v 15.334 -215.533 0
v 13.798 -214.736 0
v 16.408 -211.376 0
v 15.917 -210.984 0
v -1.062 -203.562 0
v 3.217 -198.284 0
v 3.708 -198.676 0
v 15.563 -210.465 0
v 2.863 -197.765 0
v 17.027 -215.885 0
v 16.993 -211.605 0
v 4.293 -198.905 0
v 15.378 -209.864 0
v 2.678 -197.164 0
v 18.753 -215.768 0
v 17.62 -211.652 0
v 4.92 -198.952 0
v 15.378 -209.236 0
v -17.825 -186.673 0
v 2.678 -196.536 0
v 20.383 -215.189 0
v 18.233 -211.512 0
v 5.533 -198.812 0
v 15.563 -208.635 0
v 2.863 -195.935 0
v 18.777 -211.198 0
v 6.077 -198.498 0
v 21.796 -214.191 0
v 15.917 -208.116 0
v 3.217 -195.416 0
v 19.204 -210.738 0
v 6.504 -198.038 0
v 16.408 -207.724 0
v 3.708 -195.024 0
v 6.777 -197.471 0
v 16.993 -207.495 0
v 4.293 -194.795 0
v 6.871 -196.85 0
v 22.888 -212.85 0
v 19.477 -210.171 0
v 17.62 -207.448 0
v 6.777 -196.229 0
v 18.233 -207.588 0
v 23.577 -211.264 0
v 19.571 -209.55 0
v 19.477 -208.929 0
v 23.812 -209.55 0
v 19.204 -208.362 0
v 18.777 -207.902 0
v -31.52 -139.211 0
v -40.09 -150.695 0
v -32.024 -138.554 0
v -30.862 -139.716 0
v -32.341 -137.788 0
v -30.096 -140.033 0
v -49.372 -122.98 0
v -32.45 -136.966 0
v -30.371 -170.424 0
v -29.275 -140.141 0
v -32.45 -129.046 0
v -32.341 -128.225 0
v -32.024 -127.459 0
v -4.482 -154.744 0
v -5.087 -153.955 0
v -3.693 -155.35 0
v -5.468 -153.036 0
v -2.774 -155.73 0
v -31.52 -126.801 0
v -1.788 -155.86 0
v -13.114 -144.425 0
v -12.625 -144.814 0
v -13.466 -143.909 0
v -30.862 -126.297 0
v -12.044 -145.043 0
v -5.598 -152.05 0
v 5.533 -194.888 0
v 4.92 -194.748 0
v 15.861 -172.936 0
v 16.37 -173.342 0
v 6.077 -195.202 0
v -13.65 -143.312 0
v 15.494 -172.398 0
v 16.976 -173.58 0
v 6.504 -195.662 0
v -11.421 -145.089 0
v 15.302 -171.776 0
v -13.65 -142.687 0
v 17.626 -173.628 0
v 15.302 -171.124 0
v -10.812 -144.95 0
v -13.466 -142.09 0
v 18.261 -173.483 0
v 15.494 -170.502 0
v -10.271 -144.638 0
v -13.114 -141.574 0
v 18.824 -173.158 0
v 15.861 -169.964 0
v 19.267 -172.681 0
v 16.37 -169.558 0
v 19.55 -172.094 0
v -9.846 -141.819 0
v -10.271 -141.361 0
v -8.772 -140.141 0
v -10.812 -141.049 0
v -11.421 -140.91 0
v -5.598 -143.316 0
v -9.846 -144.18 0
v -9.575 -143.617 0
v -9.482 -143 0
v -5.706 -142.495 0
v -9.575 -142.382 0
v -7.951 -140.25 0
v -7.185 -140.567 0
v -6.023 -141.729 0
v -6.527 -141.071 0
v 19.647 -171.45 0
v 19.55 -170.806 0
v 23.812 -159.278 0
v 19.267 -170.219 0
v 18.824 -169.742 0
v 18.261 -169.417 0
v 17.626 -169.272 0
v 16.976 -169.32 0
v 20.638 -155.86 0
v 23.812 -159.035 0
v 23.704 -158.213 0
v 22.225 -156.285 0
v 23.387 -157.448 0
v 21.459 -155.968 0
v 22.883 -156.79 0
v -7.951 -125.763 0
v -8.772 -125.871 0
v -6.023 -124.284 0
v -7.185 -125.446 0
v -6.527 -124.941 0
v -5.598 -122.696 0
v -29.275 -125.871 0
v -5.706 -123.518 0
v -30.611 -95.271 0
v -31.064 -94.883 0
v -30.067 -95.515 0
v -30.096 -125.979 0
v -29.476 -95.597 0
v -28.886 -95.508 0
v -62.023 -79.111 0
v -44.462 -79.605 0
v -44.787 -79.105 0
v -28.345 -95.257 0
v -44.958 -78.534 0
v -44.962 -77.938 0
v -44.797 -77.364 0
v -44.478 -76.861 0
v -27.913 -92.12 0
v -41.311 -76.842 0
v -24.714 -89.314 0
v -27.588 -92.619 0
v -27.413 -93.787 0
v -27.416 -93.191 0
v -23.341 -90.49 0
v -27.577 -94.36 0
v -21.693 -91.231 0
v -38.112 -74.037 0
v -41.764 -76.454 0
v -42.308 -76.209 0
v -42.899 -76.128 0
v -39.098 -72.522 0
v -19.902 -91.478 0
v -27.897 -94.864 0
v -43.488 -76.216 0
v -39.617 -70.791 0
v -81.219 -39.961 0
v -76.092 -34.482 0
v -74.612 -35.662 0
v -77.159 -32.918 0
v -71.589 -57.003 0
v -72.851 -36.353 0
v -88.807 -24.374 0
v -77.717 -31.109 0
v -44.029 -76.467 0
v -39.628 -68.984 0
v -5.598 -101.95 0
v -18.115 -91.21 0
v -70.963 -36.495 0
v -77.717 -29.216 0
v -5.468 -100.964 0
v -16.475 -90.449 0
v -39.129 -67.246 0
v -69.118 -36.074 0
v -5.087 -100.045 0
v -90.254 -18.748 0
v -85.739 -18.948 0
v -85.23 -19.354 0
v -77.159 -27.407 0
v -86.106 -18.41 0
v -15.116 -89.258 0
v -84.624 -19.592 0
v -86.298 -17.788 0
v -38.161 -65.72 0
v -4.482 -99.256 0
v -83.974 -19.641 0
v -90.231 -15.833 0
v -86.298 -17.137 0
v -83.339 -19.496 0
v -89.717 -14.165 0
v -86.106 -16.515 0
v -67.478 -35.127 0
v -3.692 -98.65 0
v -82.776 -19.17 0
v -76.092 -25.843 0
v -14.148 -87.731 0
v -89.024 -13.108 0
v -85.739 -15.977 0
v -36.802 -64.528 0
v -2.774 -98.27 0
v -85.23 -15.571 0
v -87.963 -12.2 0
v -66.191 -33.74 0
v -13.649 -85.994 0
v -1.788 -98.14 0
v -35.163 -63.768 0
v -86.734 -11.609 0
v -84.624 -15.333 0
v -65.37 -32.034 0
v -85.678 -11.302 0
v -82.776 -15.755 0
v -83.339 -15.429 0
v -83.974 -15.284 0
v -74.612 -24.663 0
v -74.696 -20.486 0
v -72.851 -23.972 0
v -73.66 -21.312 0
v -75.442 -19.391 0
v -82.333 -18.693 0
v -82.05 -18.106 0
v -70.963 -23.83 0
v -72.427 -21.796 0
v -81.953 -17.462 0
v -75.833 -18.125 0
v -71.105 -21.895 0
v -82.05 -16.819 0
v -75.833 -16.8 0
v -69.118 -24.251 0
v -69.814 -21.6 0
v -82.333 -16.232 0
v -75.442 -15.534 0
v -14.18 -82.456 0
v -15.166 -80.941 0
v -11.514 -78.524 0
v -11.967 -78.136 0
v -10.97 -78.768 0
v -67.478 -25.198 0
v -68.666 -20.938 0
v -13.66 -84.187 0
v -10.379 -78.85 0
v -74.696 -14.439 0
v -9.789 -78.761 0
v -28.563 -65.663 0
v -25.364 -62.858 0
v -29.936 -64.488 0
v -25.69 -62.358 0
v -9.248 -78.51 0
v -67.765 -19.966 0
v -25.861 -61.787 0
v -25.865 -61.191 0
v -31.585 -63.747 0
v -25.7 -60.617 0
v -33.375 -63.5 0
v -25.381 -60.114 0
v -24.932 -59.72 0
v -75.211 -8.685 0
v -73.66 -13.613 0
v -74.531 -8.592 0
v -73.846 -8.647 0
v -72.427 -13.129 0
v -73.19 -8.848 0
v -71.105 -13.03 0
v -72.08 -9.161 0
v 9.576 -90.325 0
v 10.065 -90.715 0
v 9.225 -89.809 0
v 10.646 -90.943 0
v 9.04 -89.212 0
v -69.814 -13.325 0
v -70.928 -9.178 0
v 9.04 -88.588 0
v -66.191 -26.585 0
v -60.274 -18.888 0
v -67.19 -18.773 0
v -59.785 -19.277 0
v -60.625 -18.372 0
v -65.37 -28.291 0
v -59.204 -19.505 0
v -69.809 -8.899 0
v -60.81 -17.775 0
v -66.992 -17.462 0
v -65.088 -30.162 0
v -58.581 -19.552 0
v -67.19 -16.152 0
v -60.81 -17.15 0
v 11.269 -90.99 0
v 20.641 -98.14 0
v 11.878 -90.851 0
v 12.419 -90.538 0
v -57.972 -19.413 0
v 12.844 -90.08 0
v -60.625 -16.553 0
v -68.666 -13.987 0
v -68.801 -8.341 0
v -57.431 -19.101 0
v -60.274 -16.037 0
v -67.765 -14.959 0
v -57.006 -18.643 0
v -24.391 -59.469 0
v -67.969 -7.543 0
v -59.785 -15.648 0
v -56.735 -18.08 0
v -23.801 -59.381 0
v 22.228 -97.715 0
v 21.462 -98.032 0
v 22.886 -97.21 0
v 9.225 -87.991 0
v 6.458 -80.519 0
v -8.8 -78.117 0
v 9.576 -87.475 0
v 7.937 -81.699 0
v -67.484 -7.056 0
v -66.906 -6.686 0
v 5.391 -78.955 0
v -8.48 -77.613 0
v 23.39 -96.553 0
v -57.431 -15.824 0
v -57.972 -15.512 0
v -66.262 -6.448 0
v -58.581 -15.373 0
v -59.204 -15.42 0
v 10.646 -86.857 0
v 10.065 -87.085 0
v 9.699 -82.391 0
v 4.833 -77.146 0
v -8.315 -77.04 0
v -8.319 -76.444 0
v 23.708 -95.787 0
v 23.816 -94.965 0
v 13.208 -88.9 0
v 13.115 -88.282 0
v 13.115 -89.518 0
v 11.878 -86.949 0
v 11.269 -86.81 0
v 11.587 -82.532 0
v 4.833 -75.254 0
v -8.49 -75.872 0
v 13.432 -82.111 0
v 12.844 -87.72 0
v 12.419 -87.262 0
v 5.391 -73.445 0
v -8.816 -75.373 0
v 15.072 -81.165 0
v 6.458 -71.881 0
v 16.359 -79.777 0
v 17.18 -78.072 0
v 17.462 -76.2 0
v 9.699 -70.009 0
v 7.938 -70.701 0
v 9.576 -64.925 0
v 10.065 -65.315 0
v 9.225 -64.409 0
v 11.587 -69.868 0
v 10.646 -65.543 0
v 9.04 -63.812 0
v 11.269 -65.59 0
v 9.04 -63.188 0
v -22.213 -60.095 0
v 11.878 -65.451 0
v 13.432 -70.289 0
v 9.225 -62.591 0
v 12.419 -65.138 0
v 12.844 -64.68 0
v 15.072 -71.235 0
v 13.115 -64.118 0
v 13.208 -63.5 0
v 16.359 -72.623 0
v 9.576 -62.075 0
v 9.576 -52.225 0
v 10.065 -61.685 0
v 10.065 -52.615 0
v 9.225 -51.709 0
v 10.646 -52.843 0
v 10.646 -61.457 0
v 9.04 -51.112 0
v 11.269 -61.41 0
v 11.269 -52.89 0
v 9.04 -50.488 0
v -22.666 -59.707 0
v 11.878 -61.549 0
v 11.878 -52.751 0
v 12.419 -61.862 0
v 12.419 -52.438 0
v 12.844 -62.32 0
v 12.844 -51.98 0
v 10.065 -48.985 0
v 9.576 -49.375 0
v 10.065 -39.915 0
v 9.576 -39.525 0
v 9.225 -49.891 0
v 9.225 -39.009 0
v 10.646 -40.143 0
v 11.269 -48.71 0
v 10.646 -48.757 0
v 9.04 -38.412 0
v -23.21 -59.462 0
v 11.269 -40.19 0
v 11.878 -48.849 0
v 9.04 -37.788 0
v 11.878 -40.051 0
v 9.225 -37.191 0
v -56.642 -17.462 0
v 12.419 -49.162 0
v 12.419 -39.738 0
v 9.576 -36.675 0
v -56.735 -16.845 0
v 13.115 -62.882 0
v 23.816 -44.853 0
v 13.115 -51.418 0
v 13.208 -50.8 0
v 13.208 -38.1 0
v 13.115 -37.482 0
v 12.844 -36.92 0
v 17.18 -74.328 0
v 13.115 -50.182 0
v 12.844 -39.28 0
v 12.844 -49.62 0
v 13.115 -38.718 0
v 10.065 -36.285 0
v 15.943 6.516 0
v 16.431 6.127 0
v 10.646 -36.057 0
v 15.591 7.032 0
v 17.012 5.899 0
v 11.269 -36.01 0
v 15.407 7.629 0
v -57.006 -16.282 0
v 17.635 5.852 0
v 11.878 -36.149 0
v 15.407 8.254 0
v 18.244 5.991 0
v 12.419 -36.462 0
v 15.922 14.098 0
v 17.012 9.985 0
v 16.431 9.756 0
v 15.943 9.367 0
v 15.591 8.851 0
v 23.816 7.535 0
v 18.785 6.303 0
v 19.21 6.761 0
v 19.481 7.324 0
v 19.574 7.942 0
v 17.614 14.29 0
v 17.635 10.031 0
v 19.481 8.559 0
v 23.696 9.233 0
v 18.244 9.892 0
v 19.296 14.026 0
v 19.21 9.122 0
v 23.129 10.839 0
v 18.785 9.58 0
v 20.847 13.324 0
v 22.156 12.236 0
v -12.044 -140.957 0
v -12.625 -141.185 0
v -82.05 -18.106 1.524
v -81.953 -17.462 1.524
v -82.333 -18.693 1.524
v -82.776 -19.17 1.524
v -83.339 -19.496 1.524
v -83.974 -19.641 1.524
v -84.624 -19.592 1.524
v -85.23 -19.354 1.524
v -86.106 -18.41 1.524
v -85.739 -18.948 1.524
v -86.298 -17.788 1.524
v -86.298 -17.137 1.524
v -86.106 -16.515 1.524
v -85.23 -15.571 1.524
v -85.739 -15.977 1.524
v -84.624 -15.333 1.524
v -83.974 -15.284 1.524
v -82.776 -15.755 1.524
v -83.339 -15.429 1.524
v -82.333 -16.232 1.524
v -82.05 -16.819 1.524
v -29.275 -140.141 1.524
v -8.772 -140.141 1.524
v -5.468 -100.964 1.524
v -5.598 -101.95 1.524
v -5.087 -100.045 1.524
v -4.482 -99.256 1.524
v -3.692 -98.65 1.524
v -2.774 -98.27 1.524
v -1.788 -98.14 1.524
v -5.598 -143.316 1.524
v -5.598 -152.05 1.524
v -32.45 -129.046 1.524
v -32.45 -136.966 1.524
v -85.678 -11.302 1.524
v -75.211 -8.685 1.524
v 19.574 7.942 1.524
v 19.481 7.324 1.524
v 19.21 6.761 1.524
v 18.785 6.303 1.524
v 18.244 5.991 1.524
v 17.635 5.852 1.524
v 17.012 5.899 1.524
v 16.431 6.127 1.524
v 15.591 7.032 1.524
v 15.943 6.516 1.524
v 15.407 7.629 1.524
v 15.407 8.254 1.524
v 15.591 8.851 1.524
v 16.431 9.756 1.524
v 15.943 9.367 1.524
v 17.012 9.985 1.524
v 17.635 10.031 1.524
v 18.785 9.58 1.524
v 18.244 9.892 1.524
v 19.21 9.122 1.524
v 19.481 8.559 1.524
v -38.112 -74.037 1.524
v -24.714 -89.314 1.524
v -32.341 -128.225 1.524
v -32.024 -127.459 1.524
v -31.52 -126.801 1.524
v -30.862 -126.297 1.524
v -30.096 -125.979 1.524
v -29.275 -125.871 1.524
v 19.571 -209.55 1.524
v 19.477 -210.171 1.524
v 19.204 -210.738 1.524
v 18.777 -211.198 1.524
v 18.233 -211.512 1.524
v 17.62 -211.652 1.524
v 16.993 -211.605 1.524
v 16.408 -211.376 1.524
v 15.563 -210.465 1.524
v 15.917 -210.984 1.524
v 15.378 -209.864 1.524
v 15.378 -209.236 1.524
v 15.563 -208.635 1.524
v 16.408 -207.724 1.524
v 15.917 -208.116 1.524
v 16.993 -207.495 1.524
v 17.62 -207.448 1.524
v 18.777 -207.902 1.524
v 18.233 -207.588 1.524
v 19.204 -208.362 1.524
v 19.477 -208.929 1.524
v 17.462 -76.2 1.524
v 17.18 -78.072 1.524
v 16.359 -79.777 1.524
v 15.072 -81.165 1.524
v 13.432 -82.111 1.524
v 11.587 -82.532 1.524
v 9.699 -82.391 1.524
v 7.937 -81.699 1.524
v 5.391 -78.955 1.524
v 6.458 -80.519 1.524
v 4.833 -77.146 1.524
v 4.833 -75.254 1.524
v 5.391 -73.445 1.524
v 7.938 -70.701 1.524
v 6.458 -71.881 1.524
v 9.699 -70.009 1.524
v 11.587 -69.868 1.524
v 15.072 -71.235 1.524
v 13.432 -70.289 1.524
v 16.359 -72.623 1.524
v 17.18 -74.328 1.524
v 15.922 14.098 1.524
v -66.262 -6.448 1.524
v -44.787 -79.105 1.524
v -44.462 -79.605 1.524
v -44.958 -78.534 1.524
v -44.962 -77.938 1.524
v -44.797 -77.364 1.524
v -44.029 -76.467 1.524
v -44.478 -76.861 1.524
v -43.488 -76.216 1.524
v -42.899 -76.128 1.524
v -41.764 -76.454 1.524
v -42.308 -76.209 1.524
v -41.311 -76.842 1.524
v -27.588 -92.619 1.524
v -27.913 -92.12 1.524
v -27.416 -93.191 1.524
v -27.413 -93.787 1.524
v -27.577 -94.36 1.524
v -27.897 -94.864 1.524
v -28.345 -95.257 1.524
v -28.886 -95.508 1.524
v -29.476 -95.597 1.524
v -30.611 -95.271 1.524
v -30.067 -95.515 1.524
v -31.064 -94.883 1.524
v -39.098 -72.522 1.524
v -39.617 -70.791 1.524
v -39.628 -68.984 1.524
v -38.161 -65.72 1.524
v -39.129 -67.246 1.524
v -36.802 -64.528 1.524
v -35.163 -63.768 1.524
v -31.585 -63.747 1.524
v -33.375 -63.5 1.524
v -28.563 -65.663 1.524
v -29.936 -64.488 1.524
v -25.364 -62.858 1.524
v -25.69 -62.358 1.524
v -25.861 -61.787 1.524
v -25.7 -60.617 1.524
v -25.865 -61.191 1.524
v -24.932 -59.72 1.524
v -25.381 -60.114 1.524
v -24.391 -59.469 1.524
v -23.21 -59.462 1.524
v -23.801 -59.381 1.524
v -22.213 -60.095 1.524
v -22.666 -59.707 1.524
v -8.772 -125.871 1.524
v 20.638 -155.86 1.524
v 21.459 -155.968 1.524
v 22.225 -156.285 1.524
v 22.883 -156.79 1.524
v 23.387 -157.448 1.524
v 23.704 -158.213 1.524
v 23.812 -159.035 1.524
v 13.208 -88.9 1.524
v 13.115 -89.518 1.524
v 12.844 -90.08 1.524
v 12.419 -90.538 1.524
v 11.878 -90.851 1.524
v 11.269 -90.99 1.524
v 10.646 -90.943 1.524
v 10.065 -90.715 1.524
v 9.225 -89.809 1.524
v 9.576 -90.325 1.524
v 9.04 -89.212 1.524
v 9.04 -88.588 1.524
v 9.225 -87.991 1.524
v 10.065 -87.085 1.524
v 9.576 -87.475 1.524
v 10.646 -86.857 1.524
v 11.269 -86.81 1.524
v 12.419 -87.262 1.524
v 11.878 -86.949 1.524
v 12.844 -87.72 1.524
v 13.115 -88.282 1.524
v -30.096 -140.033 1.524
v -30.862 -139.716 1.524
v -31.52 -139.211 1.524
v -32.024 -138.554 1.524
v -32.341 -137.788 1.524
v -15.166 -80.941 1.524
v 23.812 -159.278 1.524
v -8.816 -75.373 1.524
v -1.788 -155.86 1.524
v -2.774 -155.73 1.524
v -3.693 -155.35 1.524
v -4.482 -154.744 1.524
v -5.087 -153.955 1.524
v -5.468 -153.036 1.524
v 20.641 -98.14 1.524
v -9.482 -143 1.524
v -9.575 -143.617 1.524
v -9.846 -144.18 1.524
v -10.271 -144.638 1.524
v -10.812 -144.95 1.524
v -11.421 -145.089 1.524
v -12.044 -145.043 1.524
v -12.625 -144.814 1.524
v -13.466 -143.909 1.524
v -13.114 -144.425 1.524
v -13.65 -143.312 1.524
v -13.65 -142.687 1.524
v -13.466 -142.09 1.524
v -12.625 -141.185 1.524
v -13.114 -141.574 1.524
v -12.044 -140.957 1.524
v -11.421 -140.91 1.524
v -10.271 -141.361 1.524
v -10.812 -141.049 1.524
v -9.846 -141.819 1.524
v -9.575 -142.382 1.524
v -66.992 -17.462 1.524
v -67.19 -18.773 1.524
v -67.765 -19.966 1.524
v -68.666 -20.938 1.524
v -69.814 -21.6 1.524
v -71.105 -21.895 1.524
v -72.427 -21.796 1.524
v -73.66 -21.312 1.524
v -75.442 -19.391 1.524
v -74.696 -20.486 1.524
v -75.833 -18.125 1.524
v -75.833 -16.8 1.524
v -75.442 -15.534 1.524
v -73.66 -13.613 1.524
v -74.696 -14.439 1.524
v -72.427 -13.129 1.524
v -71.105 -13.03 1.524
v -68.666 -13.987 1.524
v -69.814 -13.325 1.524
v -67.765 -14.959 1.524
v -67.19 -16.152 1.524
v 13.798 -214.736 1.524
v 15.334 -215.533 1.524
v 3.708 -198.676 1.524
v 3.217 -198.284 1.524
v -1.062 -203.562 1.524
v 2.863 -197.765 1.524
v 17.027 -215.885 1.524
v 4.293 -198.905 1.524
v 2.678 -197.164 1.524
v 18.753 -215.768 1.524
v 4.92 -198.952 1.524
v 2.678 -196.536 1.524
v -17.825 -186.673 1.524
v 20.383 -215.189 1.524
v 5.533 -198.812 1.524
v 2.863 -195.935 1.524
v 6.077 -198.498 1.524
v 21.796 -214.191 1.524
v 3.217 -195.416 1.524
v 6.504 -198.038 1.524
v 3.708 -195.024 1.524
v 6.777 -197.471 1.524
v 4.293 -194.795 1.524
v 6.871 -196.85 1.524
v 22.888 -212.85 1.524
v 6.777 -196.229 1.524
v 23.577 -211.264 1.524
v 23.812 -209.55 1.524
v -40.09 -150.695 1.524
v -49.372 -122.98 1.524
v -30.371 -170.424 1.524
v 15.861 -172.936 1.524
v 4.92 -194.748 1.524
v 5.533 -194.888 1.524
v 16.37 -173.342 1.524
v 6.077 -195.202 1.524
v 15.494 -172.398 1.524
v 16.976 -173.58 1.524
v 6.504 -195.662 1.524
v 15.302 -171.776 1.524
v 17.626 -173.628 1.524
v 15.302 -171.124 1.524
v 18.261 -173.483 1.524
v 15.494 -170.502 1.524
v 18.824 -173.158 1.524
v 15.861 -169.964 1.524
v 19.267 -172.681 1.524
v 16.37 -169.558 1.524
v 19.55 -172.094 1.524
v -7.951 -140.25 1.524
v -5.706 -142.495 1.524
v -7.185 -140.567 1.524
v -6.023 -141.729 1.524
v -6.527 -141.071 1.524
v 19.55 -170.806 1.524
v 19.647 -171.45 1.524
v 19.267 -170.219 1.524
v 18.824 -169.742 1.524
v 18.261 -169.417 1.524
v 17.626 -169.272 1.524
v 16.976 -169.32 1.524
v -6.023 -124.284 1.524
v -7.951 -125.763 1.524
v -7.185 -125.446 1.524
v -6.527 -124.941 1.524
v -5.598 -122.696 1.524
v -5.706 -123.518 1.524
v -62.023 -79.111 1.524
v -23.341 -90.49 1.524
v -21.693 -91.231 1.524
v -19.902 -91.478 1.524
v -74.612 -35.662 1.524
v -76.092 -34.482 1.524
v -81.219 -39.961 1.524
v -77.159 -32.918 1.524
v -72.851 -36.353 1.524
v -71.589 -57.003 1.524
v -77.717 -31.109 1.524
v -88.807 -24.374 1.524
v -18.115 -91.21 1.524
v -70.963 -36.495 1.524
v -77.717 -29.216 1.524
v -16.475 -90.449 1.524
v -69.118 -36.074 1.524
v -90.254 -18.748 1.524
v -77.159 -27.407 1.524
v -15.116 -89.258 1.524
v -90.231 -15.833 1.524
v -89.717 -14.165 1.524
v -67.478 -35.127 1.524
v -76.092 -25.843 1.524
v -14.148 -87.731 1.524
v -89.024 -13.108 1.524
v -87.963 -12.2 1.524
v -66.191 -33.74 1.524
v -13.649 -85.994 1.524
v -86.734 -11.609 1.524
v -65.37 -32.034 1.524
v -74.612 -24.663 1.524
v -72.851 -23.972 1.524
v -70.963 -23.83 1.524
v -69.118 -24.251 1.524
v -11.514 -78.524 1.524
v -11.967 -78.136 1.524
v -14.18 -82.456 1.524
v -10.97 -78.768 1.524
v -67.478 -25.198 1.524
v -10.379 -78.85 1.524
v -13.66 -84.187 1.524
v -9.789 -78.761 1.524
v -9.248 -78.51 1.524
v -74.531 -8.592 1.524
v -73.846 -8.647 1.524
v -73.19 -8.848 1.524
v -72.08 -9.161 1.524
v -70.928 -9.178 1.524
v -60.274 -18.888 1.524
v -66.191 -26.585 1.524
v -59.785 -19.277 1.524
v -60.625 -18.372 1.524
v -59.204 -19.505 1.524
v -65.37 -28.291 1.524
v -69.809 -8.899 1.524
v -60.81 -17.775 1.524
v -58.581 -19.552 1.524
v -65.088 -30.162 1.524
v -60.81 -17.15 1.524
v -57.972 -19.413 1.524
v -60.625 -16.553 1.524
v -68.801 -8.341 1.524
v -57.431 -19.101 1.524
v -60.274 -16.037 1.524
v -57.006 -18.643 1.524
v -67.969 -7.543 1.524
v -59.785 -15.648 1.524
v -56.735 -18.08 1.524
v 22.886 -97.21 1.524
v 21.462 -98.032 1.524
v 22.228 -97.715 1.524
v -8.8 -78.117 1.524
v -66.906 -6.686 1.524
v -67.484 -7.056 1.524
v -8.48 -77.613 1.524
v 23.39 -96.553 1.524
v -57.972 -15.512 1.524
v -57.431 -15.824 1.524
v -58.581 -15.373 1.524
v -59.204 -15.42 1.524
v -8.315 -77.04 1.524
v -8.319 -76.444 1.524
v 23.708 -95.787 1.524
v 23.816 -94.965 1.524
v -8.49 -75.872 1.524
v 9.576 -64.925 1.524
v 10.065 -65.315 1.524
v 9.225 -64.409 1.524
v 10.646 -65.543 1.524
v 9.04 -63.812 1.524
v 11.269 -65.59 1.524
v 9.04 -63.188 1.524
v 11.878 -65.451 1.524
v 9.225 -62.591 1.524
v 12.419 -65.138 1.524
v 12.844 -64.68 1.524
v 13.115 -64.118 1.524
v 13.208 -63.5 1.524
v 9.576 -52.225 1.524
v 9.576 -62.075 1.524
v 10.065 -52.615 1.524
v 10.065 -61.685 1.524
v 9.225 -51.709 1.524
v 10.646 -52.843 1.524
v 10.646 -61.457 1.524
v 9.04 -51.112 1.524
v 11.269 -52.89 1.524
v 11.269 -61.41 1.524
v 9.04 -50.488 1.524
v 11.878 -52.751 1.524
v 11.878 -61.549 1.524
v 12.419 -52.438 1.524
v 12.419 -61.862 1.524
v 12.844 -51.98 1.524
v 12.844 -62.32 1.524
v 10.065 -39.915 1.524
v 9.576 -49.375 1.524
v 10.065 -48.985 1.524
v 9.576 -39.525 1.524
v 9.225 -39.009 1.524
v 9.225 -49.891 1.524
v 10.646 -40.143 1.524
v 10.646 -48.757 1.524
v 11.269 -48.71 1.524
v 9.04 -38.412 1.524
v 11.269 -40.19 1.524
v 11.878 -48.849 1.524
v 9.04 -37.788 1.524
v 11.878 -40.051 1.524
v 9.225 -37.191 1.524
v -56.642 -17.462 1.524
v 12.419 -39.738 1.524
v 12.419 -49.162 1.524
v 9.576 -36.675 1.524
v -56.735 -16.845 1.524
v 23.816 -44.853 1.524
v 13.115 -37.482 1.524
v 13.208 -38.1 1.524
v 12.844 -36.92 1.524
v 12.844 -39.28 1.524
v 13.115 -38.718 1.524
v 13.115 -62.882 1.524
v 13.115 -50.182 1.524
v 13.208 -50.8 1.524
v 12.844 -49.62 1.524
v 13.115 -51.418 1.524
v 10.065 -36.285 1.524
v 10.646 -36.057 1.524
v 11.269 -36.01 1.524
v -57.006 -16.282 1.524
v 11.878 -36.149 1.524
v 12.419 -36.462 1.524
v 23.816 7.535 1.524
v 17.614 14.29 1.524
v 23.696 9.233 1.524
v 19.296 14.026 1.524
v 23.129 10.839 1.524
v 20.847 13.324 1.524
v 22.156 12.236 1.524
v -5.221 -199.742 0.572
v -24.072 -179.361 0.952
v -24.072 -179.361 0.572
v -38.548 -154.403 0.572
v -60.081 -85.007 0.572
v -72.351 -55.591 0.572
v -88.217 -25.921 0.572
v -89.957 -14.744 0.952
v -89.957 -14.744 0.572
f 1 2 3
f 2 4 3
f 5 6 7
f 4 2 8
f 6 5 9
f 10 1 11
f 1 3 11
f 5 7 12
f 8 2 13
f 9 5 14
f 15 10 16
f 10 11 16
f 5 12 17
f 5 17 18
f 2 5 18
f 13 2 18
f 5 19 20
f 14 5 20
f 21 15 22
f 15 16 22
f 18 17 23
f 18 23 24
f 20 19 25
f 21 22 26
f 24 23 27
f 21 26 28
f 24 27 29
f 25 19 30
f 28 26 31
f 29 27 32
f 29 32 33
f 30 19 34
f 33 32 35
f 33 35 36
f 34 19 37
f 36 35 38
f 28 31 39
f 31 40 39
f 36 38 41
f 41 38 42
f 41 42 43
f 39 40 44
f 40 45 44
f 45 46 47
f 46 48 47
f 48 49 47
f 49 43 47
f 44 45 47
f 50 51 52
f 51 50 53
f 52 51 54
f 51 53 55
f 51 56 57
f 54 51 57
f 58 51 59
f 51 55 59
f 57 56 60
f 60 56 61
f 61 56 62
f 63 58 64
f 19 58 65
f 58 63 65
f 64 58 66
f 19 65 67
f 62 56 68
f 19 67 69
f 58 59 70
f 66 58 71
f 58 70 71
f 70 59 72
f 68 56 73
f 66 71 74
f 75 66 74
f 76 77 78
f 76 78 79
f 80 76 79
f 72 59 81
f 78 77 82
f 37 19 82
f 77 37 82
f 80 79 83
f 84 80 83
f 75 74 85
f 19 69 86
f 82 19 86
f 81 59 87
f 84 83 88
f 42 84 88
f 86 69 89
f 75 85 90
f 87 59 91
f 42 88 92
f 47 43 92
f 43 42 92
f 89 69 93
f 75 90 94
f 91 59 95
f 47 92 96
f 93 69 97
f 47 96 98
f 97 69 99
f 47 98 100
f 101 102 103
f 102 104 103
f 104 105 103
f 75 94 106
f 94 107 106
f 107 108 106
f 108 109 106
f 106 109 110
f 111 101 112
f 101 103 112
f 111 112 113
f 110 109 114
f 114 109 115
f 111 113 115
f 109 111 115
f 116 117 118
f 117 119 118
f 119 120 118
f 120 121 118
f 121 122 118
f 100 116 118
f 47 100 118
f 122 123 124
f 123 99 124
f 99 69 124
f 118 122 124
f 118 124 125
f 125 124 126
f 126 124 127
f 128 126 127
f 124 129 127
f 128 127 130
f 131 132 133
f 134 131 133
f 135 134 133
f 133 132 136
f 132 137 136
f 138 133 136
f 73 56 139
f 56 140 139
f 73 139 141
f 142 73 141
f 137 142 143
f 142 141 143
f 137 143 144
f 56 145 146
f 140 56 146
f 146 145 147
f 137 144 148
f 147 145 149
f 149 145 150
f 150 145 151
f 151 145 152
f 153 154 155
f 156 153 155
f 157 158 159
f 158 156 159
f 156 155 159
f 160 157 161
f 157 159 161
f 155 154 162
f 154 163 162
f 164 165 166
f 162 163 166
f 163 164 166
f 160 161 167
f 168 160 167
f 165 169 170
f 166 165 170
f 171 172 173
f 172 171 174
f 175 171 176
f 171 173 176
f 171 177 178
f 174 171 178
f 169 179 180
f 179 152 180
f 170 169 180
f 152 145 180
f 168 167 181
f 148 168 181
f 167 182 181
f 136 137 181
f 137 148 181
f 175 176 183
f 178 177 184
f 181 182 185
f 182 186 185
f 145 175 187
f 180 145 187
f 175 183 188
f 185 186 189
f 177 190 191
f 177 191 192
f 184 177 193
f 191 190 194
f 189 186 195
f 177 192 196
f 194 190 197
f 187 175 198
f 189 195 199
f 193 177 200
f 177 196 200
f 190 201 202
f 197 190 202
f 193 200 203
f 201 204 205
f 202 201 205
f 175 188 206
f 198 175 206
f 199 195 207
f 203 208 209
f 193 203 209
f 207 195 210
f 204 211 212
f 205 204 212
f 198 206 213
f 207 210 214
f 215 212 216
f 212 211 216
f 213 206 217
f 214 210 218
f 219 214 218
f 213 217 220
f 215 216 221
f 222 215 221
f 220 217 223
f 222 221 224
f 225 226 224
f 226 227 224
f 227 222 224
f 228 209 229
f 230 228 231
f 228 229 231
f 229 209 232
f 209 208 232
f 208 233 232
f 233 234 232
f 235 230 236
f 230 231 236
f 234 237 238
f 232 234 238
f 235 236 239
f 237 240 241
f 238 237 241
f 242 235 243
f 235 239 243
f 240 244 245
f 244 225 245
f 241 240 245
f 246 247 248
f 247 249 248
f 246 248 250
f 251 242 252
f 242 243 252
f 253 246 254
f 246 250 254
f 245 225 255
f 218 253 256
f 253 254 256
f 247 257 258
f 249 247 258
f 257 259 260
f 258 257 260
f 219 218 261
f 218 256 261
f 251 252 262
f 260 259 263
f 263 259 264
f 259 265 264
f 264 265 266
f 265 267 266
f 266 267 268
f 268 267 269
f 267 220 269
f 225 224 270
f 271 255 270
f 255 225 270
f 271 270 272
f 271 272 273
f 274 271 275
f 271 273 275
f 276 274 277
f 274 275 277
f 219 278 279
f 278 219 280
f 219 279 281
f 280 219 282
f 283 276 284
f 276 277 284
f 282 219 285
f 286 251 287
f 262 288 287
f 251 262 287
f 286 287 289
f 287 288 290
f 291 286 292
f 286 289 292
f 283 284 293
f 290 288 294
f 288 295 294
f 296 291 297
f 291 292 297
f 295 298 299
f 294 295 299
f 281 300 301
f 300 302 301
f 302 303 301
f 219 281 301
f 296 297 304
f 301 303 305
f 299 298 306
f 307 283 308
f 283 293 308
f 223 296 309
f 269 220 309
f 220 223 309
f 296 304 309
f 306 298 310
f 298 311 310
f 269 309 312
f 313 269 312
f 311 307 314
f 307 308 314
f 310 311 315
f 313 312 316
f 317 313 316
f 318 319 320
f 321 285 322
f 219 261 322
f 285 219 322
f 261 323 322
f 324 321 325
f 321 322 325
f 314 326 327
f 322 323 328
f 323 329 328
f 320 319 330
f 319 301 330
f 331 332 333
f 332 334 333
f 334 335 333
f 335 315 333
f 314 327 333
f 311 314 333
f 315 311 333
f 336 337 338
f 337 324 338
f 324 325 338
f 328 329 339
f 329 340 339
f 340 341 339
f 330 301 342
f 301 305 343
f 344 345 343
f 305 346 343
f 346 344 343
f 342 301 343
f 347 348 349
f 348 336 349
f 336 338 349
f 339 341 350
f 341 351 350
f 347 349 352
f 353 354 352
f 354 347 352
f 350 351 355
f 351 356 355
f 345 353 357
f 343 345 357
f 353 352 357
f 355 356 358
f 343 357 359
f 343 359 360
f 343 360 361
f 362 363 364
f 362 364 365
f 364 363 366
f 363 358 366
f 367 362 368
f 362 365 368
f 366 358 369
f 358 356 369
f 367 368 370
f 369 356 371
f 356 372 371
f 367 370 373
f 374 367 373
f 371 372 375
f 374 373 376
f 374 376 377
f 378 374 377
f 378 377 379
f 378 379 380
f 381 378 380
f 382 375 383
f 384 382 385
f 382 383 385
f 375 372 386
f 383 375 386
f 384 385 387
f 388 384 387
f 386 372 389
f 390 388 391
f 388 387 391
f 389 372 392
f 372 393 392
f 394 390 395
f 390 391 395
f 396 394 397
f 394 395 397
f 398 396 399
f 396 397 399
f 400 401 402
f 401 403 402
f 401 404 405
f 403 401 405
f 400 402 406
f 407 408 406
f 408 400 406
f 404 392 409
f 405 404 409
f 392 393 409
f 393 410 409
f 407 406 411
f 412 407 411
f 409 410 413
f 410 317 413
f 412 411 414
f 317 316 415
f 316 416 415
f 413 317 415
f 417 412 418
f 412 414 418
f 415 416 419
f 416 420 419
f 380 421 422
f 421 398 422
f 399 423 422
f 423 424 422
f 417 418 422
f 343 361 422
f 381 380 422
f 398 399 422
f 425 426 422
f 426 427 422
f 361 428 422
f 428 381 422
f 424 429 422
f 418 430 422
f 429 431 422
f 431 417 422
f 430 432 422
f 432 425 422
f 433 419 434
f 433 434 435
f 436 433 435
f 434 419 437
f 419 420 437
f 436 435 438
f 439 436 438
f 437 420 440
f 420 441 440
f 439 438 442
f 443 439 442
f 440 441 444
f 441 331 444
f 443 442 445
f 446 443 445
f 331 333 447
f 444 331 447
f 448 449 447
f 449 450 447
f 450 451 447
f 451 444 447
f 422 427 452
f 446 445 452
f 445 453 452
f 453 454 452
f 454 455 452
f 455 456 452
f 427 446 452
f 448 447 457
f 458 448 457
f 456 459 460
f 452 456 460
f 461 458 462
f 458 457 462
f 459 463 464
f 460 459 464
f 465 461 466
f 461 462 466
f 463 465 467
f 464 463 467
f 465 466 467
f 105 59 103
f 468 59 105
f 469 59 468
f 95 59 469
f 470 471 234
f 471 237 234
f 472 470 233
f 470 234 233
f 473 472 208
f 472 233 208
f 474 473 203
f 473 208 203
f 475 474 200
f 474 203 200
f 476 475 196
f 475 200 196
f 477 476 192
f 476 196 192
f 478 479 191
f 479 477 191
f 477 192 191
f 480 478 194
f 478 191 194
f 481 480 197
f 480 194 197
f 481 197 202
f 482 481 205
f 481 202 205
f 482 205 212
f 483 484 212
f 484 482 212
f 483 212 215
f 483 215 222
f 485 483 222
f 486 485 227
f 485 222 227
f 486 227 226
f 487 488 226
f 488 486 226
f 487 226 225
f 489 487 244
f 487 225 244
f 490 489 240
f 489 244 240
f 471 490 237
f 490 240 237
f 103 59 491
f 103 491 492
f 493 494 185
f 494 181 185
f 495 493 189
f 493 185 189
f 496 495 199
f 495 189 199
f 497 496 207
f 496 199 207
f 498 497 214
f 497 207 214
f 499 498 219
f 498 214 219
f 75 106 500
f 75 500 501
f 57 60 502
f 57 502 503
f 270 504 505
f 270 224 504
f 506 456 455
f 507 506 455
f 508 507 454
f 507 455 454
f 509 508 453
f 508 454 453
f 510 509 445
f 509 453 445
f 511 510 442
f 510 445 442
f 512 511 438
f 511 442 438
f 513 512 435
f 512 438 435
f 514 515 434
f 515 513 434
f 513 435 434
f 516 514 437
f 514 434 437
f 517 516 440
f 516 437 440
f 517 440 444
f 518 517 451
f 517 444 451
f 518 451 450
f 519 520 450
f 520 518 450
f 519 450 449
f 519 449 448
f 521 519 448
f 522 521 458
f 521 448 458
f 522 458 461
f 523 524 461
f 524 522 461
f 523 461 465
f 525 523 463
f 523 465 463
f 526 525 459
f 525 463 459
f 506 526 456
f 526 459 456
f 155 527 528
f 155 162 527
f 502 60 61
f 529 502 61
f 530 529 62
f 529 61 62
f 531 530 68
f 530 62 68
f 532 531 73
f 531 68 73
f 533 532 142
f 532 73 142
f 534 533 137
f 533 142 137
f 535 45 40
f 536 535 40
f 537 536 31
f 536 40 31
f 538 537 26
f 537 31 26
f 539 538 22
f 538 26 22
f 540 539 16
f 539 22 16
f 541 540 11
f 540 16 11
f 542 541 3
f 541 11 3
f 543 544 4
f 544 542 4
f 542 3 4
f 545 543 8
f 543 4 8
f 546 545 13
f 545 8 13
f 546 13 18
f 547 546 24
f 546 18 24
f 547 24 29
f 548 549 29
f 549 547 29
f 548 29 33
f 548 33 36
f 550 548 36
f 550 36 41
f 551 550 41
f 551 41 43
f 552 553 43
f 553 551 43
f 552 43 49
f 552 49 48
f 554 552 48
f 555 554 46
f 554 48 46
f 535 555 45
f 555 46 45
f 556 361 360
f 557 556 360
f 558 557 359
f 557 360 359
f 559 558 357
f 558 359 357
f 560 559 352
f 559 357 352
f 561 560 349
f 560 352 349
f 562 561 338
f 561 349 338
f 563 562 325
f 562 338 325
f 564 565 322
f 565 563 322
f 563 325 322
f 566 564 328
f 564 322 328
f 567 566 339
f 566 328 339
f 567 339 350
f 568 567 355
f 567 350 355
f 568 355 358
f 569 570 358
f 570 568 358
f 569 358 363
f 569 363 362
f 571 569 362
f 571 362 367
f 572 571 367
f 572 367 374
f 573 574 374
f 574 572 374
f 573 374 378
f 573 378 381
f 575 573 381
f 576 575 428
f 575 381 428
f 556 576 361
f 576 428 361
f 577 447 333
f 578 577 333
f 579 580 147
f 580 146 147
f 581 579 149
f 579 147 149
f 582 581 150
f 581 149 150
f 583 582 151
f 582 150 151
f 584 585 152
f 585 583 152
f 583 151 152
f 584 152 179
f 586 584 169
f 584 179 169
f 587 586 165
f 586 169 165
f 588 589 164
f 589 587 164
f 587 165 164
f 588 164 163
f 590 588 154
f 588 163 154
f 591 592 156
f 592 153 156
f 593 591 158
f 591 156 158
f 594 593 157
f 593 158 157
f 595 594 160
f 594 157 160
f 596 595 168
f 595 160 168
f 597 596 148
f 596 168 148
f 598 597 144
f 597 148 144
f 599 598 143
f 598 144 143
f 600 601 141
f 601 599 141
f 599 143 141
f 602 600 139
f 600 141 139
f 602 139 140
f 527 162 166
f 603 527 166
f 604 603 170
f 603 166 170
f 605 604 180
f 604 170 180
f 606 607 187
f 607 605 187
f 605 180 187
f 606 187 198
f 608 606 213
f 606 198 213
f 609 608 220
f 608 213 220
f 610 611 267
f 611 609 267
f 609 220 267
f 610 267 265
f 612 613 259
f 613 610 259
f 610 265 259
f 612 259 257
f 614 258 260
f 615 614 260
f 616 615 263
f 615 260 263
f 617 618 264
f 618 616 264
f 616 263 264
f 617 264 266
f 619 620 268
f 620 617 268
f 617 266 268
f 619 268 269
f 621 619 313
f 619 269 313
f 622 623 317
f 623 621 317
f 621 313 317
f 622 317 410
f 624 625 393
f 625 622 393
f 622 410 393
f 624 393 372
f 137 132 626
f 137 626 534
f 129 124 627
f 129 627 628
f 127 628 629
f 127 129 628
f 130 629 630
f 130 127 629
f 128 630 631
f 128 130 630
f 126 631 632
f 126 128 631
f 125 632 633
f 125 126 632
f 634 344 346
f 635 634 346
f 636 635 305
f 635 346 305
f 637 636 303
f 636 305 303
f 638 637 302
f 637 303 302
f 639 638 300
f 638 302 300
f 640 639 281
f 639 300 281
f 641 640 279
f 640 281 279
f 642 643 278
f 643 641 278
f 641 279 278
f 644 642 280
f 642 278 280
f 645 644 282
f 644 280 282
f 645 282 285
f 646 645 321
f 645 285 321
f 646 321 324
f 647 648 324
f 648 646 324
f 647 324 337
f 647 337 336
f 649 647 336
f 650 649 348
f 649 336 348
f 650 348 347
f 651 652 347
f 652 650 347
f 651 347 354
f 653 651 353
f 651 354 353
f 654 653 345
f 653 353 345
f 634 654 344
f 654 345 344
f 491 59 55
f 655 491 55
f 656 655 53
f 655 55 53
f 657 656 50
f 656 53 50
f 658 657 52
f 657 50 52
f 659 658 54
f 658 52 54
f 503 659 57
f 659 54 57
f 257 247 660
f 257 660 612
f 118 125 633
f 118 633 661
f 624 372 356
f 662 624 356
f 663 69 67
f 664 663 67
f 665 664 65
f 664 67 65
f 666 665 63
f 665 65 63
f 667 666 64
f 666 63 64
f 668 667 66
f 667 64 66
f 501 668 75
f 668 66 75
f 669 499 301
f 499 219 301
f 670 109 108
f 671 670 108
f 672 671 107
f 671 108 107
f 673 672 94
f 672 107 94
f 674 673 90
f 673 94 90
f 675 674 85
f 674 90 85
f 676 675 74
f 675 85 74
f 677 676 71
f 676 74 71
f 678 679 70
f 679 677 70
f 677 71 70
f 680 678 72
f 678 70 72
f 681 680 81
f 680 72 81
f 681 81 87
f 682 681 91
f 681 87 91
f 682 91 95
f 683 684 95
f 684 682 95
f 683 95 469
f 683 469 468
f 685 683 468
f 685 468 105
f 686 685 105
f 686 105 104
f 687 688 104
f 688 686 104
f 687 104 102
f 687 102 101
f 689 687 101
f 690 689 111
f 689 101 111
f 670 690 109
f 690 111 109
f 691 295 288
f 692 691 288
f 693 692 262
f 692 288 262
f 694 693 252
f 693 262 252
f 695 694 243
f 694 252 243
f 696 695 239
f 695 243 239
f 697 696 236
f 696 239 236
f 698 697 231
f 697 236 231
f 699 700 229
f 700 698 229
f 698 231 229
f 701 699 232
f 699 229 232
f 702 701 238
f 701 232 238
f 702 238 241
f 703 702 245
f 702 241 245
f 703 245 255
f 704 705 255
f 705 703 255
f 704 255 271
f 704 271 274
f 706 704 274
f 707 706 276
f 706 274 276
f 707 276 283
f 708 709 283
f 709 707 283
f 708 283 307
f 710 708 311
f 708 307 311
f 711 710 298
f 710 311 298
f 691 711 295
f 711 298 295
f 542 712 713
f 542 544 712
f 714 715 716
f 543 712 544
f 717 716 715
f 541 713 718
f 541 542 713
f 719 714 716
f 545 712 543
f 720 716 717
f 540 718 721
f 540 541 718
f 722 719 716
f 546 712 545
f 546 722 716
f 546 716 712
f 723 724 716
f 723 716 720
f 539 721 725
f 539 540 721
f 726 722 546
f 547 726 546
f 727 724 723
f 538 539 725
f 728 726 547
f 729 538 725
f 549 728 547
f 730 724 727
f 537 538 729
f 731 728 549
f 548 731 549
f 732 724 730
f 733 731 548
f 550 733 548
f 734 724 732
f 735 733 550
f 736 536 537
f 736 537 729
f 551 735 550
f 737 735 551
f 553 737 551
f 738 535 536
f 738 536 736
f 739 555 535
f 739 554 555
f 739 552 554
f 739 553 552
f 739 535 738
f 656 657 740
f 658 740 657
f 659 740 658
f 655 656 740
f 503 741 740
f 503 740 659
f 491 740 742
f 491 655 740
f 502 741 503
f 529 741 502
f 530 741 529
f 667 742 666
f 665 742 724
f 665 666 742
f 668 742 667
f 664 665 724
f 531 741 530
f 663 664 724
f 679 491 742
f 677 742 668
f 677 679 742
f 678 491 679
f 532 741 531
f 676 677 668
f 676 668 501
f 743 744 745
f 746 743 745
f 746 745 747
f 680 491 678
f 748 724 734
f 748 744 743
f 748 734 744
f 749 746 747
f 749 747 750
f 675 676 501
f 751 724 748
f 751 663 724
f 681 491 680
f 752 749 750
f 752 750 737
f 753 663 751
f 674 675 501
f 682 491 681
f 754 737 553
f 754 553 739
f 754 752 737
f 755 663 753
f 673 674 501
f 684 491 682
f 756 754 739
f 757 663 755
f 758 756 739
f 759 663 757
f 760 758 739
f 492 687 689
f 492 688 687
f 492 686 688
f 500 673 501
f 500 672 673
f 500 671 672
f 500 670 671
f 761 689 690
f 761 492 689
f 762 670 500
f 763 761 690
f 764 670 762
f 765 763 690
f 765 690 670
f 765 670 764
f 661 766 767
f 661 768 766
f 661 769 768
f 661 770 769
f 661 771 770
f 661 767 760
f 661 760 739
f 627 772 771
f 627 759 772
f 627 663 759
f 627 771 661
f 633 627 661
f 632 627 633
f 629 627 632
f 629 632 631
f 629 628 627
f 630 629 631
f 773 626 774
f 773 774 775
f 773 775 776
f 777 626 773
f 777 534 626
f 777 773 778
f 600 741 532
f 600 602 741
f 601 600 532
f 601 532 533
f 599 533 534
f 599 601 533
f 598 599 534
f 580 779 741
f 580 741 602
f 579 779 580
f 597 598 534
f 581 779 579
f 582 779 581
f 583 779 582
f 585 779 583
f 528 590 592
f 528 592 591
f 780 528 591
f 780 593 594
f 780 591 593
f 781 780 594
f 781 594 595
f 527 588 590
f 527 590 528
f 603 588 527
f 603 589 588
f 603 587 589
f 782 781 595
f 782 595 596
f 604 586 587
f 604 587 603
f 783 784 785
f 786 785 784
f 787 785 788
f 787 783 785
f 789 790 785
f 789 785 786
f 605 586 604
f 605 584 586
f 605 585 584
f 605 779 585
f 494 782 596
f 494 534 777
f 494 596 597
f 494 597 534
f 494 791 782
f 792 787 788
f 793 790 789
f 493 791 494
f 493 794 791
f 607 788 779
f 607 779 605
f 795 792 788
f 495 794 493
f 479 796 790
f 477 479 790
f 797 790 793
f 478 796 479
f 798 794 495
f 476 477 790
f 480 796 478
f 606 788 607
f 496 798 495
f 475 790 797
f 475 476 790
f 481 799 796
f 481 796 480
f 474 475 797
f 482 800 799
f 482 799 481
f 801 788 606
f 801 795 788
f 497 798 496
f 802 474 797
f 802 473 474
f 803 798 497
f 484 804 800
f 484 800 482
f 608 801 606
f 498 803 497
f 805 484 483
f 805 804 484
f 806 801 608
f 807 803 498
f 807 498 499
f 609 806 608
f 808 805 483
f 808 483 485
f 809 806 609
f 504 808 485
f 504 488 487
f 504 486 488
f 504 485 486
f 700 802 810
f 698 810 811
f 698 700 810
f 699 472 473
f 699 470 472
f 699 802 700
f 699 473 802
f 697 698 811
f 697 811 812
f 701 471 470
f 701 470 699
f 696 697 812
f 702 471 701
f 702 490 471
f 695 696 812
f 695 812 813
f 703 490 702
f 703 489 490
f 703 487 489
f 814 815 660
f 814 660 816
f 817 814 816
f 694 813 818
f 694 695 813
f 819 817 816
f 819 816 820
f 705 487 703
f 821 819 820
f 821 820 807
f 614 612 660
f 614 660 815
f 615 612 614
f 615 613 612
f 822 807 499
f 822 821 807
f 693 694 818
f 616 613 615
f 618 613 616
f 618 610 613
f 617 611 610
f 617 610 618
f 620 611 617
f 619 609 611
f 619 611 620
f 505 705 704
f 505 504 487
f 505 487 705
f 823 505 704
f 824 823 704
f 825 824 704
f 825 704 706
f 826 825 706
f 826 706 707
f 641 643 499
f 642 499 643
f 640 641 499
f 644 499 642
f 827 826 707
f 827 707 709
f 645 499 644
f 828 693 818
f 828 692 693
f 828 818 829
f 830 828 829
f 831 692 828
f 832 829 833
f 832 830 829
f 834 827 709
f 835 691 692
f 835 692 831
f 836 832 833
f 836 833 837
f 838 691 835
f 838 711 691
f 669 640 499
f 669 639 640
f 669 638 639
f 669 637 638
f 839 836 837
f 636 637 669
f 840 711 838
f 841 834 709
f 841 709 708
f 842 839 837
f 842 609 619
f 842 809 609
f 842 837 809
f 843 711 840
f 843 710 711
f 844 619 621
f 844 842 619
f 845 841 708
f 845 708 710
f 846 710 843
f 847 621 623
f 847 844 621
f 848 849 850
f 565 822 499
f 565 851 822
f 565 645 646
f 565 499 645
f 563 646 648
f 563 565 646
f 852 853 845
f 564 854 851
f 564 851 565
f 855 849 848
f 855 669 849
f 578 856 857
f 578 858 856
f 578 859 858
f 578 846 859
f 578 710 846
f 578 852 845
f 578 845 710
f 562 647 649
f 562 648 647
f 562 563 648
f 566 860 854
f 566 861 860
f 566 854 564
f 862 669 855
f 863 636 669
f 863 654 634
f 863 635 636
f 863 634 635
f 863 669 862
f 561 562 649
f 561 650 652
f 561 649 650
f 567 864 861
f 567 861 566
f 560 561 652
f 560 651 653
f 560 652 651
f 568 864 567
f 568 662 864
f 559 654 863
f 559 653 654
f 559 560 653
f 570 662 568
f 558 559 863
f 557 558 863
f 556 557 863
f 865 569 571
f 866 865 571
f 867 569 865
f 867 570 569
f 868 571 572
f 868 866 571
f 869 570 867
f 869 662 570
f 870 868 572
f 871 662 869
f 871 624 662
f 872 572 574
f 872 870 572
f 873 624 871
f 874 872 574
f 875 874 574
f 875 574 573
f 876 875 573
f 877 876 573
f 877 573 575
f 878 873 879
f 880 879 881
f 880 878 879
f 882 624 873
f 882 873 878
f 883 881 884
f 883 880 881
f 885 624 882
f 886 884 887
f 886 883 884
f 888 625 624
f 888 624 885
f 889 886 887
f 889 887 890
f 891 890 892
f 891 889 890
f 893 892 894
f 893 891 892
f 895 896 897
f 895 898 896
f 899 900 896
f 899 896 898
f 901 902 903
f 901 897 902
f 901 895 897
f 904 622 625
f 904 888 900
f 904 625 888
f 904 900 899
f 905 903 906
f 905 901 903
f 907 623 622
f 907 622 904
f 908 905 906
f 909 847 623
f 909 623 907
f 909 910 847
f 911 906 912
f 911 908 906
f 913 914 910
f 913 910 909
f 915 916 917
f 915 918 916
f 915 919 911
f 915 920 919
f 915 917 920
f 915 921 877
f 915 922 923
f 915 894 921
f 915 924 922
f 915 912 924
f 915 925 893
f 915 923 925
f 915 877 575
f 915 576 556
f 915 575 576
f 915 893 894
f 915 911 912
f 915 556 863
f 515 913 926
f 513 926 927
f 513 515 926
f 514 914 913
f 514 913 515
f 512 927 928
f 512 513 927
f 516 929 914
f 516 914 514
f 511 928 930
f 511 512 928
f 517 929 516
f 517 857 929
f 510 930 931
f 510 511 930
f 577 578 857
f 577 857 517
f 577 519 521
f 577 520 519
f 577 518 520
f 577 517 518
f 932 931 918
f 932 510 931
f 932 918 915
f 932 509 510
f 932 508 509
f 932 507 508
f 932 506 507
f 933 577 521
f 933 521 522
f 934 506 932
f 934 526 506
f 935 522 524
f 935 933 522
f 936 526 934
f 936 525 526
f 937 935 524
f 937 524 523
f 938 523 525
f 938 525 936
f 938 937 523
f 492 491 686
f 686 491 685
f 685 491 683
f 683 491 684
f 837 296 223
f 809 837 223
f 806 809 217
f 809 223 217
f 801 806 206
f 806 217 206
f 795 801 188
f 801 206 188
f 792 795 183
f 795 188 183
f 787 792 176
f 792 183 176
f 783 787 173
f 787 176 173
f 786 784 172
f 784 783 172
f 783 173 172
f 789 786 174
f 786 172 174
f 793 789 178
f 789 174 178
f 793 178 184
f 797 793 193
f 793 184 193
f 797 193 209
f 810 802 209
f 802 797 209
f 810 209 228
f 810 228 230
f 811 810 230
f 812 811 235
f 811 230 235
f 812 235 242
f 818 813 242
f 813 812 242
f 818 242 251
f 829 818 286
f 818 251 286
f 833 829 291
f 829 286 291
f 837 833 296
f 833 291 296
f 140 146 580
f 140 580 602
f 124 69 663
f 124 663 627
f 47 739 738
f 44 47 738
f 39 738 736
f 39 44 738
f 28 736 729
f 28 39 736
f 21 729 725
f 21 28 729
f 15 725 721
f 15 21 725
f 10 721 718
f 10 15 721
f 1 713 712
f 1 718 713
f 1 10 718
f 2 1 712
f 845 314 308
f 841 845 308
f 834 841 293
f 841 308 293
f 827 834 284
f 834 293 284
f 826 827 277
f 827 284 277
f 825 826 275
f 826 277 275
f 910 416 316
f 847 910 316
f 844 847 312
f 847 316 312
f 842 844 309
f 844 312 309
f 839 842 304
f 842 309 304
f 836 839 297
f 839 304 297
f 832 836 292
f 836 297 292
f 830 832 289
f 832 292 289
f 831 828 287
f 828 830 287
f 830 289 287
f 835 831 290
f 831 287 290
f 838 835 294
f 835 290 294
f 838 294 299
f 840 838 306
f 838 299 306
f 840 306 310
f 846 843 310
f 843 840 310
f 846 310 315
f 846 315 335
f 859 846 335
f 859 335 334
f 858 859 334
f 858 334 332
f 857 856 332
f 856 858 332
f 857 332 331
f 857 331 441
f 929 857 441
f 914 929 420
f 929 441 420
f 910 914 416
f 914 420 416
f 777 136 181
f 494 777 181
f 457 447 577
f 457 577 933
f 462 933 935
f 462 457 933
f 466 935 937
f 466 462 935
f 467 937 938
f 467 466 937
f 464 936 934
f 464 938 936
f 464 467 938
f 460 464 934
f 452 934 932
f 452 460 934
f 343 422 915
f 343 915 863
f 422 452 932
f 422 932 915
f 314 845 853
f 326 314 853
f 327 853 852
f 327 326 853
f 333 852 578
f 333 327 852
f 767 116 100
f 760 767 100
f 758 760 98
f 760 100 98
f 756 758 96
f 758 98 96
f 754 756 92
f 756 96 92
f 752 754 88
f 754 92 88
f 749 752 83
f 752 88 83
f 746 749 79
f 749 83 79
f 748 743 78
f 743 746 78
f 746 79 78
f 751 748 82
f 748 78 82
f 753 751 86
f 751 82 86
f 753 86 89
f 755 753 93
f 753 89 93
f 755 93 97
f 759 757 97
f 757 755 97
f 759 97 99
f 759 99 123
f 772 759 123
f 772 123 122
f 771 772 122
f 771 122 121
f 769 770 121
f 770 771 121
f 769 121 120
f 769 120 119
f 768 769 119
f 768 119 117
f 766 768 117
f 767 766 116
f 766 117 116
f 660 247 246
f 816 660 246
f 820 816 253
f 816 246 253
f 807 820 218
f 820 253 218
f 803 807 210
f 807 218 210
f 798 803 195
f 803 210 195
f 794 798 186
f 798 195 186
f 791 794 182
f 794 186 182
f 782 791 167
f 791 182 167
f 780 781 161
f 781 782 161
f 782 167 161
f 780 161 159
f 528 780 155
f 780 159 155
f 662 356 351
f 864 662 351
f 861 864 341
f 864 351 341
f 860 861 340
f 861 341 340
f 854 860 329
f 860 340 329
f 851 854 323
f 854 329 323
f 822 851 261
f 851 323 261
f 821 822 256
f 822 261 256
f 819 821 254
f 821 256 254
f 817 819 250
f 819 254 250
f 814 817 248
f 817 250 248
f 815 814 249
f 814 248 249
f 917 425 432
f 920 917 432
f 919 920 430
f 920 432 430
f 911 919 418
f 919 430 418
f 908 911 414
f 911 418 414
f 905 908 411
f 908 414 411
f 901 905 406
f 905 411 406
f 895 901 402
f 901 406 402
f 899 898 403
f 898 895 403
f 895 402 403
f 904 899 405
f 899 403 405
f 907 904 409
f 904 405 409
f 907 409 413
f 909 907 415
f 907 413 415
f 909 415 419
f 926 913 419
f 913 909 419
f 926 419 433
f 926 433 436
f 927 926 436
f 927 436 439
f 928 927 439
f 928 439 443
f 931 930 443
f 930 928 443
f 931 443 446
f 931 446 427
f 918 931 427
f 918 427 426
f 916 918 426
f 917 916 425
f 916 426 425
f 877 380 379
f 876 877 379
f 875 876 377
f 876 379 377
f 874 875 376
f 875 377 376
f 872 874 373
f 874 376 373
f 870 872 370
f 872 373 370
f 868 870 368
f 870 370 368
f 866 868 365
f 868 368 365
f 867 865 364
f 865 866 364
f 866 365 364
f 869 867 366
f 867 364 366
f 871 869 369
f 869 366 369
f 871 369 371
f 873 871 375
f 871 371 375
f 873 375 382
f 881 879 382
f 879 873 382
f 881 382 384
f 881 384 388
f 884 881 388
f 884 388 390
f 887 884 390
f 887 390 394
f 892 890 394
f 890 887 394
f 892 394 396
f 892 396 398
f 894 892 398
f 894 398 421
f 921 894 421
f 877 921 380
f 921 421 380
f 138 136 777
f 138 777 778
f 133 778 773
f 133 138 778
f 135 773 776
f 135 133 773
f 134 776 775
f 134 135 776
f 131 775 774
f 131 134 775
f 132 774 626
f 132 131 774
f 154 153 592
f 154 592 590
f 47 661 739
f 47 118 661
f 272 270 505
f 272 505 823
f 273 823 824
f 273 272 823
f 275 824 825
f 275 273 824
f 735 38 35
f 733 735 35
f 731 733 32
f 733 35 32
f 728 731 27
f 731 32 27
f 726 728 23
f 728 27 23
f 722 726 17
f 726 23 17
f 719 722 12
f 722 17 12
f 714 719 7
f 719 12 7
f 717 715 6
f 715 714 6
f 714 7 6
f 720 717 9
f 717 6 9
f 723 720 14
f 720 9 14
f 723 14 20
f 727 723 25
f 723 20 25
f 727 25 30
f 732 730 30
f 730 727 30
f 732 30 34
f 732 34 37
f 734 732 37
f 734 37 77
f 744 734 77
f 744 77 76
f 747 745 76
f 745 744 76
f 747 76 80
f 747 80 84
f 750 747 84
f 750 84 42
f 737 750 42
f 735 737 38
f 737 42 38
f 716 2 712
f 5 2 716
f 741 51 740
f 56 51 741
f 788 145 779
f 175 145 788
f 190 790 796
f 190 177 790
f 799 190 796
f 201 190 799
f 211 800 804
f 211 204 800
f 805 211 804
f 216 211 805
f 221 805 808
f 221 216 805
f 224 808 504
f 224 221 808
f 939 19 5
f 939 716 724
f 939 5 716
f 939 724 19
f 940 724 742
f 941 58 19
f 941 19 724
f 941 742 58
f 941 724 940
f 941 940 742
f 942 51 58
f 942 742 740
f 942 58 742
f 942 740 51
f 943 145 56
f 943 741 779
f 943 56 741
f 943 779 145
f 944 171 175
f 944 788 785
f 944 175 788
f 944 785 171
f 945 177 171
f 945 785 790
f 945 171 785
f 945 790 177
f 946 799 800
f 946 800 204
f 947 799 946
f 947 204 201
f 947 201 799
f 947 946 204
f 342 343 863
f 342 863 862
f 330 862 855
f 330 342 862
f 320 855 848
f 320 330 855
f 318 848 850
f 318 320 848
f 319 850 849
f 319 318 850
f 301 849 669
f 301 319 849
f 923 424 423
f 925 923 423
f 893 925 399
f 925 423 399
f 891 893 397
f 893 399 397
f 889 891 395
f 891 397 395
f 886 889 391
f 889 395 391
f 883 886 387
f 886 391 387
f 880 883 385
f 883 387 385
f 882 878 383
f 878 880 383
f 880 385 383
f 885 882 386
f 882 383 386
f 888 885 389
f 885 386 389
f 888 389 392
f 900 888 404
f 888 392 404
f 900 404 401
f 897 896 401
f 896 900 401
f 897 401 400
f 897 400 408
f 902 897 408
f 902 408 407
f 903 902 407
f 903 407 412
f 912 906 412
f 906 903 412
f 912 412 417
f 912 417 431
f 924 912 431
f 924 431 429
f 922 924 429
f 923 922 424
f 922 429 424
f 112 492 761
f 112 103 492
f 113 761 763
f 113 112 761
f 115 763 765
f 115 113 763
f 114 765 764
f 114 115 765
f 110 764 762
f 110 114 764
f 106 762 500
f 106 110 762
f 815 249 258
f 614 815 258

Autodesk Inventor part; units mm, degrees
ref_plane "YZ Plane" through (0, 0, 0) normal (1, 0, 0) x (0, 1, 0)
ref_plane "XZ Plane" through (0, 0, 0) normal (0, 1, 0) x (-1, 0, 0)
ref_plane "XY Plane" through (0, 0, 0) normal (0, 0, 1) x (1, 0, 0)
sketch "Sketch1" plane through (0, 0, 0) normal (0, 0, 1) x (1, 0, 0)
  circle A0 centre (-71.4375, -30.1625) radius 6.35
  line L0 (23.8157, 7.5349) -> (23.8157, -44.8526)
  arc A1 (13.7984, -214.7362) -> (23.8125, -209.55) centre (17.4625, -209.55) ccw
  arc A2 (23.8157, 7.5349) -> (15.9224, 14.0979) centre (17.4787, 7.9416) ccw
  circle A3 centre (-71.4375, -17.4625) radius 2.1844
  line L1 (-85.6776, -11.3021) -> (-75.211, -8.6854)
  line L2 (15.9224, 14.0979) -> (-66.2619, -6.4482)
  arc A4 (-73.1895, -8.8477) -> (-67.9692, -7.5426) centre (-71.4375, -4.7625) ccw
  arc A5 (-66.2619, -6.4482) -> (-67.9692, -7.5426) centre (-65.4918, -9.5284) ccw
  arc A6 (-73.1895, -8.8477) -> (-75.211, -8.6854) centre (-74.4409, -11.7656) ccw
  circle A7 centre (-71.4375, -17.4625) radius 4.445
  circle A8 centre (11.1125, -88.9) radius 2.0955
  line L3 (23.8125, -159.2779) -> (23.8125, -209.55)
  line L4 (23.8157, -44.8526) -> (23.8157, -94.965)
  circle A9 centre (17.4787, 7.9416) radius 2.0955
  circle A10 centre (-58.7375, -17.4625) radius 2.0955
  circle A11 centre (11.1125, -38.1) radius 2.0955
  circle A12 centre (17.4625, -209.55) radius 2.1082
  circle A13 centre (4.7625, -196.85) radius 2.1082
  line L5 (-1.7875, -155.86) -> (20.6375, -155.86)
  line L6 (23.8125, -159.035) -> (23.8125, -159.2779)
  line L7 (-1.7875, -98.14) -> (20.6407, -98.14)
  arc A14 (-5.5975, -152.05) -> (-1.7875, -155.86) centre (-1.7875, -152.05) ccw
  arc A15 (-1.7875, -98.14) -> (-5.5975, -101.95) centre (-1.7875, -101.95) ccw
  arc A16 (23.8125, -159.035) -> (20.6375, -155.86) centre (20.6375, -159.035) ccw
  arc A17 (20.6407, -98.14) -> (23.8157, -94.965) centre (20.6407, -94.965) ccw
  circle A18 centre (17.4625, -171.45) radius 2.1844
  circle A19 centre (11.1125, -63.5) radius 2.0955
  circle A20 centre (11.1125, -50.8) radius 2.0955
  circle A21 centre (11.1125, -76.2) radius 6.35
  circle A22 centre (-11.5777, -142.9997) radius 2.0955
  line L8 (-29.2746, -140.1414) -> (-8.7725, -140.1414)
  line L9 (-8.7725, -125.8713) -> (-29.2746, -125.8713)
  line L10 (-32.4496, -129.0463) -> (-32.4496, -136.9664)
  line L11 (-5.5975, -143.3164) -> (-5.5975, -152.05)
  line L12 (-5.5975, -122.6963) -> (-5.5975, -101.95)
  arc A23 (-5.5975, -143.3164) -> (-8.7725, -140.1414) centre (-8.7725, -143.3164) ccw
  arc A24 (-8.7725, -125.8713) -> (-5.5975, -122.6963) centre (-8.7725, -122.6963) ccw
  arc A25 (-32.4496, -136.9664) -> (-29.2746, -140.1414) centre (-29.2746, -136.9664) ccw
  arc A26 (-29.2746, -125.8713) -> (-32.4496, -129.0463) centre (-29.2746, -129.0463) ccw
  line L13 (13.7984, -214.7362) -> (12.5183, -213.8318) construction
  line L14 (12.5183, -213.8318) -> (0, -206.2508) construction
  line L15 (0, -206.2508) -> (-17.0986, -187.3696) construction
  line L16 (-17.0986, -187.3696) -> (-31.7765, -172.0523) construction
  line L17 (-31.7765, -172.0523) -> (-45.7993, -138.4697) construction
  line L18 (-45.7993, -138.4697) -> (-54.717, -102.5523) construction
  line L19 (-54.717, -102.5523) -> (-65.0675, -66.1978) construction
  line L20 (-65.0675, -66.1978) -> (-78.5193, -45.4549) construction
  line L21 (-78.5193, -45.4549) -> (-96.3149, -13.9614) construction
  line L22 (-96.3149, -13.9614) -> (-87.4239, -11.7387) construction
  line L23 (-87.4239, -11.7387) -> (-85.6776, -11.3021) construction
  spline S0 degree 4 poles (13.7984, -214.7362) (12.5183, -213.8318) (0, -206.2508) (-17.0986, -187.3696) (-31.7765, -172.0523) (-45.7993, -138.4697) (-54.717, -102.5523) (-65.0675, -66.1978) (-78.5193, -45.4549) (-96.3149, -13.9614) (-87.4239, -11.7387) (-85.6776, -11.3021) knots 1 1 1 1 1 2 3 4 5 6 7 8 9 9 9 9 9
  circle A27 centre (-84.1375, -17.4625) radius 2.1844
  line L24 (-44.4616, -79.6051) -> (-31.0641, -94.8828)
  line L25 (-27.913, -92.1196) -> (-41.3106, -76.8418)
  arc A28 (-31.0641, -94.8828) -> (-27.913, -92.1196) centre (-29.4885, -93.5012) ccw
  line L26 (-22.2134, -60.0949) -> (-8.8159, -75.3726)
  line L27 (-11.9669, -78.1359) -> (-25.3644, -62.8582)
  arc A29 (-11.9669, -78.1359) -> (-8.8159, -75.3726) centre (-10.3914, -76.7543) ccw
  arc A30 (-41.3106, -76.8418) -> (-44.4616, -79.6051) centre (-42.8861, -78.2235) ccw
  arc A31 (-22.2134, -60.0949) -> (-25.3644, -62.8582) centre (-23.7889, -61.4765) ccw
  line L28 (-38.1118, -74.0367) -> (-24.7143, -89.3144)
  line L29 (-15.1657, -80.941) -> (-28.5632, -65.6633)
  arc A32 (-24.7143, -89.3144) -> (-15.1657, -80.941) centre (-19.94, -85.1277) ccw
  arc A33 (-28.5632, -65.6633) -> (-38.1118, -74.0367) centre (-33.3375, -69.85) ccw
  point P0 (0, 0)
  point P1 (13.9752, -214.8567)
  point P2 (-74.0123, -8.3858)
  point P3 (-67.4605, -6.7478)
  point P4 (23.8125, -209.55)
  point P5 (-28.1069, -95.0767)
  point P6 (-9.0098, -78.3298)
  dimension "d13" = 12.7
  dimension "d30" = 4.3688
  dimension "d32" = 3.175
  dimension "d33" = 8.89
  dimension "d34" = 4.191
  dimension "d51" = 4.191
  dimension "d54" = 4.2164
  dimension "d55" = 4.2164
  dimension "d62" = 3.175
  dimension "d65" = 4.191
  dimension "d66" = 12.7
  dimension "d67" = 4.191
  dimension "d68" = 4.191
  dimension "d69" = 4.191
  dimension "d71" = 4.191
  dimension "d73" = 3.175
  dimension "d74" = 3.175
  dimension "d84" = 20.32
extrude "Extrusion9" add sketch "Sketch1" along normal blind 1.524 contours L0 L4 A17 L7 A15 L12 A24 L9 A26 L10 A25 L8 A23 L11 A14 L5 A16 L6 L3 A1 S0 L1 A6 A4 A5 L2 A2
properties part number "outer-tower-support-proto"
